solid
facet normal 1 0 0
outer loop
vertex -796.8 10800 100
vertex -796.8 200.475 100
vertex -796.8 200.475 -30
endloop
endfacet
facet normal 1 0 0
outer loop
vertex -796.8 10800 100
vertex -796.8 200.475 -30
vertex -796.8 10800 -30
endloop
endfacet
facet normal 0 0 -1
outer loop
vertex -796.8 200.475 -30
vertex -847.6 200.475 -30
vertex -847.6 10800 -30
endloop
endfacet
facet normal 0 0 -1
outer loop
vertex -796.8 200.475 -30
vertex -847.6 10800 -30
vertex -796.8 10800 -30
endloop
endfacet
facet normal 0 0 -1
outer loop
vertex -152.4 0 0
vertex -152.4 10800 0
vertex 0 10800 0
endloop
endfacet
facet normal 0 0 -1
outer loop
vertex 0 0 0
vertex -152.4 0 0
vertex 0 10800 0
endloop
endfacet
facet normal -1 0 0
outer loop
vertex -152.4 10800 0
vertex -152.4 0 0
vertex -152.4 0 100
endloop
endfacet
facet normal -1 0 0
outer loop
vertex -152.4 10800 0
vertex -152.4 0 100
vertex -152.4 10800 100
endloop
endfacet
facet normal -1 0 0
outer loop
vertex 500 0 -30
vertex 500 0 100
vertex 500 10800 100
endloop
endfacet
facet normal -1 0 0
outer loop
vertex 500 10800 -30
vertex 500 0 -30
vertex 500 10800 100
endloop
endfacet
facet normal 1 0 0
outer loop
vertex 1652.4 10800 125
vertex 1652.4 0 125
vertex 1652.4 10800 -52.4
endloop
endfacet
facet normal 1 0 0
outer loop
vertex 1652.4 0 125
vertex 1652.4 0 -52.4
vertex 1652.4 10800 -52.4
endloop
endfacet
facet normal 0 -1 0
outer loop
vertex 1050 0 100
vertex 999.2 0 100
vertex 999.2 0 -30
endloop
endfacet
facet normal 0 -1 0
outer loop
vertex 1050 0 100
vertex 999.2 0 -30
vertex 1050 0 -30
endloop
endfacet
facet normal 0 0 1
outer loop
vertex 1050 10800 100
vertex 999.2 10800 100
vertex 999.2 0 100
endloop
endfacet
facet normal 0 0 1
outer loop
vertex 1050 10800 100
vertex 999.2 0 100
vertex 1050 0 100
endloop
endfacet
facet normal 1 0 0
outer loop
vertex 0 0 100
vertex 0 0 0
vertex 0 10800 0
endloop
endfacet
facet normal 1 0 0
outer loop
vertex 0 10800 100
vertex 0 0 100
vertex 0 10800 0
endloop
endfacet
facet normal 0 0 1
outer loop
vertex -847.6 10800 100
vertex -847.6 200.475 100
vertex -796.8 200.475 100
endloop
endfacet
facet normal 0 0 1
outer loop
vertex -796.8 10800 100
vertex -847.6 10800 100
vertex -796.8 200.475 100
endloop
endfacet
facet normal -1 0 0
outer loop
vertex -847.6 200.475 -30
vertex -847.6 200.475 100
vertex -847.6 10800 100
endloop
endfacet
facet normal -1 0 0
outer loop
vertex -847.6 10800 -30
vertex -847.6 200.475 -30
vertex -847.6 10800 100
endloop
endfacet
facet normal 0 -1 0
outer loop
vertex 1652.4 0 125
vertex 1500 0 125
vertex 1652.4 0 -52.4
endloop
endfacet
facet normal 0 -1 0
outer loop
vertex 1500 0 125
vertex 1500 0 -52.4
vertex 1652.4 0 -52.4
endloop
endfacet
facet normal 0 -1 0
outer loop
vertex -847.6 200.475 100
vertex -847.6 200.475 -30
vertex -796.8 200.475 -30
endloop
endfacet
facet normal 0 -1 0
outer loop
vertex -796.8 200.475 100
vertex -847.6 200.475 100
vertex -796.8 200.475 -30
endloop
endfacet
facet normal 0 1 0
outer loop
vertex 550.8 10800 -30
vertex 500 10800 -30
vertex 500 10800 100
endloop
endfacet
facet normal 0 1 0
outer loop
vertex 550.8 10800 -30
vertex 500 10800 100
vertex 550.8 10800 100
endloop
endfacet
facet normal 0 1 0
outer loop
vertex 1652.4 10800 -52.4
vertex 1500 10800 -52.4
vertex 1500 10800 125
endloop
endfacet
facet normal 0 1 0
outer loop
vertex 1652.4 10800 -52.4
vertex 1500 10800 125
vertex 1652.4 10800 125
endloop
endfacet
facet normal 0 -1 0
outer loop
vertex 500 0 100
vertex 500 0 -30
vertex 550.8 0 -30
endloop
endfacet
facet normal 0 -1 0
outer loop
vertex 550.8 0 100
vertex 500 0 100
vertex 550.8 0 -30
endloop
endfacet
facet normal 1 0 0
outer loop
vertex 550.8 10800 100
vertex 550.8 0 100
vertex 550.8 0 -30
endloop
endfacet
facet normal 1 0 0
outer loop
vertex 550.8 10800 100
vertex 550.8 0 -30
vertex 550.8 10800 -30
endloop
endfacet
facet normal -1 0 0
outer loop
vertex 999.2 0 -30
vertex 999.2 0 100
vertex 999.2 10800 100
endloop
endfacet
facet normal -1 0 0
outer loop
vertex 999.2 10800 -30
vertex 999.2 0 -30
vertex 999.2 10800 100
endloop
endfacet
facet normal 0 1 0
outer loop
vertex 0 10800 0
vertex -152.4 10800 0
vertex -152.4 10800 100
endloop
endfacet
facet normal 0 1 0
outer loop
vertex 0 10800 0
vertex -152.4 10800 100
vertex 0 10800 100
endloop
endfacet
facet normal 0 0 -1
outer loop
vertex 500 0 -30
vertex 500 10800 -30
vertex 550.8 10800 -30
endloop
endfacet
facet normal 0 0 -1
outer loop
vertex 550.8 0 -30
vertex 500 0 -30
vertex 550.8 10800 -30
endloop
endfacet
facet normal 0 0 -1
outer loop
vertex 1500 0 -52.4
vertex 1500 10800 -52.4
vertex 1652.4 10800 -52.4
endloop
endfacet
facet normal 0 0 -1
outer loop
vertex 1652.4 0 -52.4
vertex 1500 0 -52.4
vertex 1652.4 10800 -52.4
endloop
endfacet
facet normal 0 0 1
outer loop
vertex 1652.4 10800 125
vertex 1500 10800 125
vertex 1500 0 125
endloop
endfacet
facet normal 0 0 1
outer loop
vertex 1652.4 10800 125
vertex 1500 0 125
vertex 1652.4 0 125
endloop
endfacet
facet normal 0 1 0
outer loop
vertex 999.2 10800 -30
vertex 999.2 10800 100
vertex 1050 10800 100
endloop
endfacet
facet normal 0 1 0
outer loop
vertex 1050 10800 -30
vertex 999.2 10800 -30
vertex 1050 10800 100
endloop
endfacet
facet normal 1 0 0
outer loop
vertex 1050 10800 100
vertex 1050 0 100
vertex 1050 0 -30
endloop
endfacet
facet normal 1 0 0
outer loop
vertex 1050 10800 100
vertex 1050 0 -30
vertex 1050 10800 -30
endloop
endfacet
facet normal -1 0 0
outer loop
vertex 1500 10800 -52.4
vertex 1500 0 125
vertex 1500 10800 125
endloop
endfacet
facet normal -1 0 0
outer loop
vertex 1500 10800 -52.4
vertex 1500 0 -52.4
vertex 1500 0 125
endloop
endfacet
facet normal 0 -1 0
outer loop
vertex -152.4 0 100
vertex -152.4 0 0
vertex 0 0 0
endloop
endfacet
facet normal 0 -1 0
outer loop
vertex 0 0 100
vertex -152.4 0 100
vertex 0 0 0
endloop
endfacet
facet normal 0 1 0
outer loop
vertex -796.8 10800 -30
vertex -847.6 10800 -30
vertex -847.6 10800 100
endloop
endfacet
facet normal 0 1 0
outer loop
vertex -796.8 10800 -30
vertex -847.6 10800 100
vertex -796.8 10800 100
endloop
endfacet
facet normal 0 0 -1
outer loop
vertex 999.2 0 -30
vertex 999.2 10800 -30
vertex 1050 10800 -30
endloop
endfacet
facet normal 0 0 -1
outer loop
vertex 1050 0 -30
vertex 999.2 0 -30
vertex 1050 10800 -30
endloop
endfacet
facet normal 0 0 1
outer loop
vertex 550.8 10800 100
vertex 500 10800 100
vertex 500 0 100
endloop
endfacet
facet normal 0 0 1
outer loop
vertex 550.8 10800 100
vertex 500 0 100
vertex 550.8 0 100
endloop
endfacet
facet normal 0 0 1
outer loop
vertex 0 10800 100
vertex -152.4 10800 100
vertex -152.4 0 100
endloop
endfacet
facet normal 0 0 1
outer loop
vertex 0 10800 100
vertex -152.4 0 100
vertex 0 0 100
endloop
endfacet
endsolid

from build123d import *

# Parameters (mm, degrees)
F0_W     = 152.4
F0_H     = 10800
F1_DEPTH = 100
F2_W     = 152.4
F2_H     = 10800
F3_DEPTH = 152.4
F4_W     = 50.8
F4_H     = 10800
F5_DEPTH = 127
F4_H_2   = 10599.524739
F6_DEPTH = 130
F7_DEPTH = 25


with BuildPart() as f1:
    # F0 (on Top) → F1 (new body)
    with BuildSketch(Plane.XY):
        with Locations((-76.2, 5400)):
            Rectangle(F0_W, F0_H)
    extrude(amount=F1_DEPTH)


with BuildPart() as f3:
    # F2 (on face) → F3 (new body)
    with BuildSketch(Plane.XY.offset(100)):
        with Locations((1576.2, 5400)):
            Rectangle(F2_W, F2_H)
    extrude(amount=-F3_DEPTH)

    # F2 (on face) → F7 (join)
    with BuildSketch(Plane.XY.offset(100)):
        with Locations((1576.2, 5400)):
            Rectangle(F2_W, F2_H)
    extrude(amount=F7_DEPTH)


with BuildPart() as f5:
    # F4 (on face) → F5 (new body)
    with BuildSketch(Plane.XY.offset(100)):
        with Locations((525.4, 5400)):
            Rectangle(F4_W, F4_H)
    extrude(amount=-F5_DEPTH)

    # F4 (on face) → F6 (join)
    with BuildSketch(Plane.XY.offset(100)):
        with Locations((525.4, 5400)):
            Rectangle(F4_W, F4_H)
        with Locations((1024.6, 5400)):
            Rectangle(F4_W, F4_H)
        with Locations((-822.2, 5500.23763)):
            Rectangle(F4_W, F4_H_2)
    extrude(amount=-F6_DEPTH)


solid = Compound([f1.part, f3.part, f5.part])
